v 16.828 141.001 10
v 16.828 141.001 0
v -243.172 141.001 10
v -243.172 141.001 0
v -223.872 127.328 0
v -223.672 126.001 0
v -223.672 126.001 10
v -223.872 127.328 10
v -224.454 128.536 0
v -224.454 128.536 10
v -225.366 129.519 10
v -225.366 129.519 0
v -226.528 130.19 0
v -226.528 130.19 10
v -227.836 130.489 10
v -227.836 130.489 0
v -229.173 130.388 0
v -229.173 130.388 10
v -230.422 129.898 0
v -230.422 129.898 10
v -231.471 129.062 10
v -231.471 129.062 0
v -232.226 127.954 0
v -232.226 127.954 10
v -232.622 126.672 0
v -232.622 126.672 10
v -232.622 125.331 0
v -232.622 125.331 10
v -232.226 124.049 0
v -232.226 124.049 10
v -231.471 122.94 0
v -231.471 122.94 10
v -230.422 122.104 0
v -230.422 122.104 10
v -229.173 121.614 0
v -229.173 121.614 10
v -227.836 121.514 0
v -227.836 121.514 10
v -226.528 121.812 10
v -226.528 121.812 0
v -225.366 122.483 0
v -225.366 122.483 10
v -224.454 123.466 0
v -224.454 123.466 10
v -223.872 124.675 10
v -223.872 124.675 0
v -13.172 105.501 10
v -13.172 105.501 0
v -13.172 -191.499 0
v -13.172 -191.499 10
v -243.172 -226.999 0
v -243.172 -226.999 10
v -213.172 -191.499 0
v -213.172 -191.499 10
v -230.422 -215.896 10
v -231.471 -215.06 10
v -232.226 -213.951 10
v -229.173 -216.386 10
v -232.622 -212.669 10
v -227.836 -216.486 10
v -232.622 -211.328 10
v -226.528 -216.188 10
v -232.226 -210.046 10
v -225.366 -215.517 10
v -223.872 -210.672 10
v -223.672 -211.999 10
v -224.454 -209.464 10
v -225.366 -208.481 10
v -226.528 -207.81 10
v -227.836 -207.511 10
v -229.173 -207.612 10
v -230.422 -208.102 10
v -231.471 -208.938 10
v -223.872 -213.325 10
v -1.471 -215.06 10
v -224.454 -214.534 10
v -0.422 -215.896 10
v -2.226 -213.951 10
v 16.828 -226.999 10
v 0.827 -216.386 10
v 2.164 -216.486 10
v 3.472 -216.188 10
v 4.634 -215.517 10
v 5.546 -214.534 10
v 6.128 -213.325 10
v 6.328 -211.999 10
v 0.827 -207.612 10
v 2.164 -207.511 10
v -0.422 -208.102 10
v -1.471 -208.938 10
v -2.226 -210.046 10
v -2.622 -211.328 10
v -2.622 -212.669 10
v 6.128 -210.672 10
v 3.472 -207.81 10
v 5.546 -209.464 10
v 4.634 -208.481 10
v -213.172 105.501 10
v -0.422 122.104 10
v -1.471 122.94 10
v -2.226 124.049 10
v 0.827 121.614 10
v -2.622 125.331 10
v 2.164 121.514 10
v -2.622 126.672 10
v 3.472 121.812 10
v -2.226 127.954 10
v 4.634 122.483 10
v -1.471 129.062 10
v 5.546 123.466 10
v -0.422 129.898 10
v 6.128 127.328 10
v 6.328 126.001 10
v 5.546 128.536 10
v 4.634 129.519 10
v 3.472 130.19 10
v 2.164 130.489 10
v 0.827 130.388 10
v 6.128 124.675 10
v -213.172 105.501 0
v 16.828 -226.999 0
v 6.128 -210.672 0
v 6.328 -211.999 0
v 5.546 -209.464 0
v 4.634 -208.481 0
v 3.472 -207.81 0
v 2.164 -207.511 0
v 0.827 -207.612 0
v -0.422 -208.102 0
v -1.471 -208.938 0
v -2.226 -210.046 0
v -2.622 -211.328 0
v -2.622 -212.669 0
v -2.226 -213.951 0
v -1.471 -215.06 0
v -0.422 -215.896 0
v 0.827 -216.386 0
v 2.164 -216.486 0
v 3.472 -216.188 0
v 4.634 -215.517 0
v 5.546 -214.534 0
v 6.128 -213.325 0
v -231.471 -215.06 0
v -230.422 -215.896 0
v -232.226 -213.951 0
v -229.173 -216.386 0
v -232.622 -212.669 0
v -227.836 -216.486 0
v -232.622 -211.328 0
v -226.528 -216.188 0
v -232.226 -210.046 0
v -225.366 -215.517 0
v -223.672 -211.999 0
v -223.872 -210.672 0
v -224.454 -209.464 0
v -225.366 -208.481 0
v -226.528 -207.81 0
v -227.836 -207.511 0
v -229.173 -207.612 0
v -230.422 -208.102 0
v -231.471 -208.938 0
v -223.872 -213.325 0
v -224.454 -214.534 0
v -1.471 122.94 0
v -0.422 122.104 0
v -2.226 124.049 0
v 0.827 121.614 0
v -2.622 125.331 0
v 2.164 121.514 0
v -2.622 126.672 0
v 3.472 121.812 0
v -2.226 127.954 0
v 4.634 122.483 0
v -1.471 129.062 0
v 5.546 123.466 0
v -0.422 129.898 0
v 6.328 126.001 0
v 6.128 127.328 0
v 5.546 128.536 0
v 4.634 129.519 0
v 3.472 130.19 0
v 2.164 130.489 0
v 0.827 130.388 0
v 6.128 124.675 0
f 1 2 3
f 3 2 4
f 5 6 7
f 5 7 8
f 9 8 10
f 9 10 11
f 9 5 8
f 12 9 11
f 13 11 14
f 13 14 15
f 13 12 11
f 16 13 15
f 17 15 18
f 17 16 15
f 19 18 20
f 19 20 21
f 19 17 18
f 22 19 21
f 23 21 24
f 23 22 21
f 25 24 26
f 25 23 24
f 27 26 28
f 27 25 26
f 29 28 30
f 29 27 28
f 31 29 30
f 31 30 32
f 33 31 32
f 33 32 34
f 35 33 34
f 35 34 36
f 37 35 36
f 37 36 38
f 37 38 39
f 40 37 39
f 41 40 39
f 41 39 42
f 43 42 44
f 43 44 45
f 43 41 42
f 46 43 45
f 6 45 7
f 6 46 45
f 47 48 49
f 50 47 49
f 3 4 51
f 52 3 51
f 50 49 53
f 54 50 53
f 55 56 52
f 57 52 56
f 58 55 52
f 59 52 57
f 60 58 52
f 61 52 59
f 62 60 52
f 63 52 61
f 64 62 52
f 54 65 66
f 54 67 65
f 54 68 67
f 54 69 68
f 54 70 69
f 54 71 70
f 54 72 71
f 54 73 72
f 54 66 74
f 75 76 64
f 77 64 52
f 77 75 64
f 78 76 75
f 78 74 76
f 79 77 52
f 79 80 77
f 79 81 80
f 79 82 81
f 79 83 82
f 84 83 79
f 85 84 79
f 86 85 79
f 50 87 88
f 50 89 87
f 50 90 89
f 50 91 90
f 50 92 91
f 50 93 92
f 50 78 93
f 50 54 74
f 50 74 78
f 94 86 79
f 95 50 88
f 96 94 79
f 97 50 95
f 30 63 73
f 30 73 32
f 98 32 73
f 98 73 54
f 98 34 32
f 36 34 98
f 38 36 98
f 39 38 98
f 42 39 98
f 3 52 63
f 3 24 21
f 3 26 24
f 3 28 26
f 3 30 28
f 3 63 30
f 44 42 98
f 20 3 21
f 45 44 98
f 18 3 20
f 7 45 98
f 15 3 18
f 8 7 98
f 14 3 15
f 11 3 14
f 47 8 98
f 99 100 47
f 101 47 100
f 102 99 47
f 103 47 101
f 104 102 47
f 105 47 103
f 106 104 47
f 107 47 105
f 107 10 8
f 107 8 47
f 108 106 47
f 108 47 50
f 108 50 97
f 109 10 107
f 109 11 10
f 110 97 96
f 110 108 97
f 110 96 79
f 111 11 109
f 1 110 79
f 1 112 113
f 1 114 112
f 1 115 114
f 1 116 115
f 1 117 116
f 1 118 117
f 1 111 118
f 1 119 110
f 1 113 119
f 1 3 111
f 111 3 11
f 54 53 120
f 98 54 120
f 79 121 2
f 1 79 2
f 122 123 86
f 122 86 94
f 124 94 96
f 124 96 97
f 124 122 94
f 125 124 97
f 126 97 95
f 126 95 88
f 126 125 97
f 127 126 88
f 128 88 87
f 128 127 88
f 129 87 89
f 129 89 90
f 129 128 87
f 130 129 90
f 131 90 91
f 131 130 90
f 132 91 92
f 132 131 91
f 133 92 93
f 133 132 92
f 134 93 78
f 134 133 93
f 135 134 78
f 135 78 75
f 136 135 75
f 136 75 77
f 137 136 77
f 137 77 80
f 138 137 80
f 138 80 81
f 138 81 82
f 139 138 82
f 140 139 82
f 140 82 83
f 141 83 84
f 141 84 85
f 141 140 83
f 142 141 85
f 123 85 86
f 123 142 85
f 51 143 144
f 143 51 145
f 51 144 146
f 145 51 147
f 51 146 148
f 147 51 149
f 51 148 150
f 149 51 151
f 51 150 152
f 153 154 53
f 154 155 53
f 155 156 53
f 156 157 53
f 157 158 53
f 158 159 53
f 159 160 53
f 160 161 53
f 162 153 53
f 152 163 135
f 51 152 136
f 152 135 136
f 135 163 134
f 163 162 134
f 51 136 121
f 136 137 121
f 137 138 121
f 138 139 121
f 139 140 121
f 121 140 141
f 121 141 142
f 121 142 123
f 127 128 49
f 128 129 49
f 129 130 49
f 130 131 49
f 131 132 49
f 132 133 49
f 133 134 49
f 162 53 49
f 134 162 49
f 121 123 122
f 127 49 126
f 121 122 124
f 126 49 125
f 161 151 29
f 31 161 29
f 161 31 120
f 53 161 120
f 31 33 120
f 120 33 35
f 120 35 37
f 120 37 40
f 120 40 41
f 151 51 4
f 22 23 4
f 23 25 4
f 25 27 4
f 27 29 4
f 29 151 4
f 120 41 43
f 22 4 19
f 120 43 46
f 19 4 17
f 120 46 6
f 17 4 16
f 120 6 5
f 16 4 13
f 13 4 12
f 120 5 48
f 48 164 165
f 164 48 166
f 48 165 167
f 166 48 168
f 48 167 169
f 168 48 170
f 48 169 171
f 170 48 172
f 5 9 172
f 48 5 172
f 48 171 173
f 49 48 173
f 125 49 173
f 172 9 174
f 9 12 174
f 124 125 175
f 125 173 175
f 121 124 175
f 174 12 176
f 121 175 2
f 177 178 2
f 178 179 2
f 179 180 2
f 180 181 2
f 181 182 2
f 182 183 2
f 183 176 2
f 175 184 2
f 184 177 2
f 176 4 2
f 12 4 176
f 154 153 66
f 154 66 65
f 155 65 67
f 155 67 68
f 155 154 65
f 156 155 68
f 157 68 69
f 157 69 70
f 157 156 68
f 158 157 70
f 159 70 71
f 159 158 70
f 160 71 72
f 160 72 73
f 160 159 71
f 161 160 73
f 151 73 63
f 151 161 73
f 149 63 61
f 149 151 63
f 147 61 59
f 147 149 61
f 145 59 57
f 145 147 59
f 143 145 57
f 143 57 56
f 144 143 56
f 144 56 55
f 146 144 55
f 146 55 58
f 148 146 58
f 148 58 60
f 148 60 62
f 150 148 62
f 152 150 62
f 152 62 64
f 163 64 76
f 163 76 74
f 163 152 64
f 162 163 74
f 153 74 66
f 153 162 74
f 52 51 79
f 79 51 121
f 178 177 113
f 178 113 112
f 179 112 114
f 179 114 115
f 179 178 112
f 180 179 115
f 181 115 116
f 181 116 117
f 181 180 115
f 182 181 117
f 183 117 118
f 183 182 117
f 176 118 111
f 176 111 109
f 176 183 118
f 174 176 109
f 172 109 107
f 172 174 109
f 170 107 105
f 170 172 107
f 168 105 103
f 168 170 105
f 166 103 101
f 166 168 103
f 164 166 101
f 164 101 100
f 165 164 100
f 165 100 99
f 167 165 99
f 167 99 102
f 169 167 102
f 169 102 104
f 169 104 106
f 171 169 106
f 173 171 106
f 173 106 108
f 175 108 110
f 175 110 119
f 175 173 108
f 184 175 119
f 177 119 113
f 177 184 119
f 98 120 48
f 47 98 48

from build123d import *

# Parameters (mm, degrees)
F0_R     = 4.5
F1_DEPTH = 10


with BuildPart() as f1:
    # F0 (on Top) → F1 (new body)
    with BuildSketch(Plane.XY):
        Polygon((-243.172072, 141.001241), (-243.172072, -226.998759), (-67.646502, -226.998759), (-67.646502, -191.498759), (-213.172072, -191.498759), (-213.172072, 105.501241), (-113.172072, 105.501241), (-113.172072, 141.001241), align=None)
        with Locations((-228.172072, -211.998759)):
            Circle(F0_R, mode=Mode.SUBTRACT)
        with Locations((-228.172072, 126.001241)):
            Circle(F0_R, mode=Mode.SUBTRACT)
        Polygon((-67.646502, -191.498759), (-67.646502, -226.998759), (16.827928, -226.998759), (16.827928, 141.001241), (-113.172072, 141.001241), (-113.172072, 105.501241), (-13.172072, 105.501241), (-13.172072, -191.498759), align=None)
        with Locations((1.827928, -211.998759)):
            Circle(F0_R, mode=Mode.SUBTRACT)
        with Locations((1.827928, 126.001241)):
            Circle(F0_R, mode=Mode.SUBTRACT)
    extrude(amount=F1_DEPTH)


solid = f1.part
